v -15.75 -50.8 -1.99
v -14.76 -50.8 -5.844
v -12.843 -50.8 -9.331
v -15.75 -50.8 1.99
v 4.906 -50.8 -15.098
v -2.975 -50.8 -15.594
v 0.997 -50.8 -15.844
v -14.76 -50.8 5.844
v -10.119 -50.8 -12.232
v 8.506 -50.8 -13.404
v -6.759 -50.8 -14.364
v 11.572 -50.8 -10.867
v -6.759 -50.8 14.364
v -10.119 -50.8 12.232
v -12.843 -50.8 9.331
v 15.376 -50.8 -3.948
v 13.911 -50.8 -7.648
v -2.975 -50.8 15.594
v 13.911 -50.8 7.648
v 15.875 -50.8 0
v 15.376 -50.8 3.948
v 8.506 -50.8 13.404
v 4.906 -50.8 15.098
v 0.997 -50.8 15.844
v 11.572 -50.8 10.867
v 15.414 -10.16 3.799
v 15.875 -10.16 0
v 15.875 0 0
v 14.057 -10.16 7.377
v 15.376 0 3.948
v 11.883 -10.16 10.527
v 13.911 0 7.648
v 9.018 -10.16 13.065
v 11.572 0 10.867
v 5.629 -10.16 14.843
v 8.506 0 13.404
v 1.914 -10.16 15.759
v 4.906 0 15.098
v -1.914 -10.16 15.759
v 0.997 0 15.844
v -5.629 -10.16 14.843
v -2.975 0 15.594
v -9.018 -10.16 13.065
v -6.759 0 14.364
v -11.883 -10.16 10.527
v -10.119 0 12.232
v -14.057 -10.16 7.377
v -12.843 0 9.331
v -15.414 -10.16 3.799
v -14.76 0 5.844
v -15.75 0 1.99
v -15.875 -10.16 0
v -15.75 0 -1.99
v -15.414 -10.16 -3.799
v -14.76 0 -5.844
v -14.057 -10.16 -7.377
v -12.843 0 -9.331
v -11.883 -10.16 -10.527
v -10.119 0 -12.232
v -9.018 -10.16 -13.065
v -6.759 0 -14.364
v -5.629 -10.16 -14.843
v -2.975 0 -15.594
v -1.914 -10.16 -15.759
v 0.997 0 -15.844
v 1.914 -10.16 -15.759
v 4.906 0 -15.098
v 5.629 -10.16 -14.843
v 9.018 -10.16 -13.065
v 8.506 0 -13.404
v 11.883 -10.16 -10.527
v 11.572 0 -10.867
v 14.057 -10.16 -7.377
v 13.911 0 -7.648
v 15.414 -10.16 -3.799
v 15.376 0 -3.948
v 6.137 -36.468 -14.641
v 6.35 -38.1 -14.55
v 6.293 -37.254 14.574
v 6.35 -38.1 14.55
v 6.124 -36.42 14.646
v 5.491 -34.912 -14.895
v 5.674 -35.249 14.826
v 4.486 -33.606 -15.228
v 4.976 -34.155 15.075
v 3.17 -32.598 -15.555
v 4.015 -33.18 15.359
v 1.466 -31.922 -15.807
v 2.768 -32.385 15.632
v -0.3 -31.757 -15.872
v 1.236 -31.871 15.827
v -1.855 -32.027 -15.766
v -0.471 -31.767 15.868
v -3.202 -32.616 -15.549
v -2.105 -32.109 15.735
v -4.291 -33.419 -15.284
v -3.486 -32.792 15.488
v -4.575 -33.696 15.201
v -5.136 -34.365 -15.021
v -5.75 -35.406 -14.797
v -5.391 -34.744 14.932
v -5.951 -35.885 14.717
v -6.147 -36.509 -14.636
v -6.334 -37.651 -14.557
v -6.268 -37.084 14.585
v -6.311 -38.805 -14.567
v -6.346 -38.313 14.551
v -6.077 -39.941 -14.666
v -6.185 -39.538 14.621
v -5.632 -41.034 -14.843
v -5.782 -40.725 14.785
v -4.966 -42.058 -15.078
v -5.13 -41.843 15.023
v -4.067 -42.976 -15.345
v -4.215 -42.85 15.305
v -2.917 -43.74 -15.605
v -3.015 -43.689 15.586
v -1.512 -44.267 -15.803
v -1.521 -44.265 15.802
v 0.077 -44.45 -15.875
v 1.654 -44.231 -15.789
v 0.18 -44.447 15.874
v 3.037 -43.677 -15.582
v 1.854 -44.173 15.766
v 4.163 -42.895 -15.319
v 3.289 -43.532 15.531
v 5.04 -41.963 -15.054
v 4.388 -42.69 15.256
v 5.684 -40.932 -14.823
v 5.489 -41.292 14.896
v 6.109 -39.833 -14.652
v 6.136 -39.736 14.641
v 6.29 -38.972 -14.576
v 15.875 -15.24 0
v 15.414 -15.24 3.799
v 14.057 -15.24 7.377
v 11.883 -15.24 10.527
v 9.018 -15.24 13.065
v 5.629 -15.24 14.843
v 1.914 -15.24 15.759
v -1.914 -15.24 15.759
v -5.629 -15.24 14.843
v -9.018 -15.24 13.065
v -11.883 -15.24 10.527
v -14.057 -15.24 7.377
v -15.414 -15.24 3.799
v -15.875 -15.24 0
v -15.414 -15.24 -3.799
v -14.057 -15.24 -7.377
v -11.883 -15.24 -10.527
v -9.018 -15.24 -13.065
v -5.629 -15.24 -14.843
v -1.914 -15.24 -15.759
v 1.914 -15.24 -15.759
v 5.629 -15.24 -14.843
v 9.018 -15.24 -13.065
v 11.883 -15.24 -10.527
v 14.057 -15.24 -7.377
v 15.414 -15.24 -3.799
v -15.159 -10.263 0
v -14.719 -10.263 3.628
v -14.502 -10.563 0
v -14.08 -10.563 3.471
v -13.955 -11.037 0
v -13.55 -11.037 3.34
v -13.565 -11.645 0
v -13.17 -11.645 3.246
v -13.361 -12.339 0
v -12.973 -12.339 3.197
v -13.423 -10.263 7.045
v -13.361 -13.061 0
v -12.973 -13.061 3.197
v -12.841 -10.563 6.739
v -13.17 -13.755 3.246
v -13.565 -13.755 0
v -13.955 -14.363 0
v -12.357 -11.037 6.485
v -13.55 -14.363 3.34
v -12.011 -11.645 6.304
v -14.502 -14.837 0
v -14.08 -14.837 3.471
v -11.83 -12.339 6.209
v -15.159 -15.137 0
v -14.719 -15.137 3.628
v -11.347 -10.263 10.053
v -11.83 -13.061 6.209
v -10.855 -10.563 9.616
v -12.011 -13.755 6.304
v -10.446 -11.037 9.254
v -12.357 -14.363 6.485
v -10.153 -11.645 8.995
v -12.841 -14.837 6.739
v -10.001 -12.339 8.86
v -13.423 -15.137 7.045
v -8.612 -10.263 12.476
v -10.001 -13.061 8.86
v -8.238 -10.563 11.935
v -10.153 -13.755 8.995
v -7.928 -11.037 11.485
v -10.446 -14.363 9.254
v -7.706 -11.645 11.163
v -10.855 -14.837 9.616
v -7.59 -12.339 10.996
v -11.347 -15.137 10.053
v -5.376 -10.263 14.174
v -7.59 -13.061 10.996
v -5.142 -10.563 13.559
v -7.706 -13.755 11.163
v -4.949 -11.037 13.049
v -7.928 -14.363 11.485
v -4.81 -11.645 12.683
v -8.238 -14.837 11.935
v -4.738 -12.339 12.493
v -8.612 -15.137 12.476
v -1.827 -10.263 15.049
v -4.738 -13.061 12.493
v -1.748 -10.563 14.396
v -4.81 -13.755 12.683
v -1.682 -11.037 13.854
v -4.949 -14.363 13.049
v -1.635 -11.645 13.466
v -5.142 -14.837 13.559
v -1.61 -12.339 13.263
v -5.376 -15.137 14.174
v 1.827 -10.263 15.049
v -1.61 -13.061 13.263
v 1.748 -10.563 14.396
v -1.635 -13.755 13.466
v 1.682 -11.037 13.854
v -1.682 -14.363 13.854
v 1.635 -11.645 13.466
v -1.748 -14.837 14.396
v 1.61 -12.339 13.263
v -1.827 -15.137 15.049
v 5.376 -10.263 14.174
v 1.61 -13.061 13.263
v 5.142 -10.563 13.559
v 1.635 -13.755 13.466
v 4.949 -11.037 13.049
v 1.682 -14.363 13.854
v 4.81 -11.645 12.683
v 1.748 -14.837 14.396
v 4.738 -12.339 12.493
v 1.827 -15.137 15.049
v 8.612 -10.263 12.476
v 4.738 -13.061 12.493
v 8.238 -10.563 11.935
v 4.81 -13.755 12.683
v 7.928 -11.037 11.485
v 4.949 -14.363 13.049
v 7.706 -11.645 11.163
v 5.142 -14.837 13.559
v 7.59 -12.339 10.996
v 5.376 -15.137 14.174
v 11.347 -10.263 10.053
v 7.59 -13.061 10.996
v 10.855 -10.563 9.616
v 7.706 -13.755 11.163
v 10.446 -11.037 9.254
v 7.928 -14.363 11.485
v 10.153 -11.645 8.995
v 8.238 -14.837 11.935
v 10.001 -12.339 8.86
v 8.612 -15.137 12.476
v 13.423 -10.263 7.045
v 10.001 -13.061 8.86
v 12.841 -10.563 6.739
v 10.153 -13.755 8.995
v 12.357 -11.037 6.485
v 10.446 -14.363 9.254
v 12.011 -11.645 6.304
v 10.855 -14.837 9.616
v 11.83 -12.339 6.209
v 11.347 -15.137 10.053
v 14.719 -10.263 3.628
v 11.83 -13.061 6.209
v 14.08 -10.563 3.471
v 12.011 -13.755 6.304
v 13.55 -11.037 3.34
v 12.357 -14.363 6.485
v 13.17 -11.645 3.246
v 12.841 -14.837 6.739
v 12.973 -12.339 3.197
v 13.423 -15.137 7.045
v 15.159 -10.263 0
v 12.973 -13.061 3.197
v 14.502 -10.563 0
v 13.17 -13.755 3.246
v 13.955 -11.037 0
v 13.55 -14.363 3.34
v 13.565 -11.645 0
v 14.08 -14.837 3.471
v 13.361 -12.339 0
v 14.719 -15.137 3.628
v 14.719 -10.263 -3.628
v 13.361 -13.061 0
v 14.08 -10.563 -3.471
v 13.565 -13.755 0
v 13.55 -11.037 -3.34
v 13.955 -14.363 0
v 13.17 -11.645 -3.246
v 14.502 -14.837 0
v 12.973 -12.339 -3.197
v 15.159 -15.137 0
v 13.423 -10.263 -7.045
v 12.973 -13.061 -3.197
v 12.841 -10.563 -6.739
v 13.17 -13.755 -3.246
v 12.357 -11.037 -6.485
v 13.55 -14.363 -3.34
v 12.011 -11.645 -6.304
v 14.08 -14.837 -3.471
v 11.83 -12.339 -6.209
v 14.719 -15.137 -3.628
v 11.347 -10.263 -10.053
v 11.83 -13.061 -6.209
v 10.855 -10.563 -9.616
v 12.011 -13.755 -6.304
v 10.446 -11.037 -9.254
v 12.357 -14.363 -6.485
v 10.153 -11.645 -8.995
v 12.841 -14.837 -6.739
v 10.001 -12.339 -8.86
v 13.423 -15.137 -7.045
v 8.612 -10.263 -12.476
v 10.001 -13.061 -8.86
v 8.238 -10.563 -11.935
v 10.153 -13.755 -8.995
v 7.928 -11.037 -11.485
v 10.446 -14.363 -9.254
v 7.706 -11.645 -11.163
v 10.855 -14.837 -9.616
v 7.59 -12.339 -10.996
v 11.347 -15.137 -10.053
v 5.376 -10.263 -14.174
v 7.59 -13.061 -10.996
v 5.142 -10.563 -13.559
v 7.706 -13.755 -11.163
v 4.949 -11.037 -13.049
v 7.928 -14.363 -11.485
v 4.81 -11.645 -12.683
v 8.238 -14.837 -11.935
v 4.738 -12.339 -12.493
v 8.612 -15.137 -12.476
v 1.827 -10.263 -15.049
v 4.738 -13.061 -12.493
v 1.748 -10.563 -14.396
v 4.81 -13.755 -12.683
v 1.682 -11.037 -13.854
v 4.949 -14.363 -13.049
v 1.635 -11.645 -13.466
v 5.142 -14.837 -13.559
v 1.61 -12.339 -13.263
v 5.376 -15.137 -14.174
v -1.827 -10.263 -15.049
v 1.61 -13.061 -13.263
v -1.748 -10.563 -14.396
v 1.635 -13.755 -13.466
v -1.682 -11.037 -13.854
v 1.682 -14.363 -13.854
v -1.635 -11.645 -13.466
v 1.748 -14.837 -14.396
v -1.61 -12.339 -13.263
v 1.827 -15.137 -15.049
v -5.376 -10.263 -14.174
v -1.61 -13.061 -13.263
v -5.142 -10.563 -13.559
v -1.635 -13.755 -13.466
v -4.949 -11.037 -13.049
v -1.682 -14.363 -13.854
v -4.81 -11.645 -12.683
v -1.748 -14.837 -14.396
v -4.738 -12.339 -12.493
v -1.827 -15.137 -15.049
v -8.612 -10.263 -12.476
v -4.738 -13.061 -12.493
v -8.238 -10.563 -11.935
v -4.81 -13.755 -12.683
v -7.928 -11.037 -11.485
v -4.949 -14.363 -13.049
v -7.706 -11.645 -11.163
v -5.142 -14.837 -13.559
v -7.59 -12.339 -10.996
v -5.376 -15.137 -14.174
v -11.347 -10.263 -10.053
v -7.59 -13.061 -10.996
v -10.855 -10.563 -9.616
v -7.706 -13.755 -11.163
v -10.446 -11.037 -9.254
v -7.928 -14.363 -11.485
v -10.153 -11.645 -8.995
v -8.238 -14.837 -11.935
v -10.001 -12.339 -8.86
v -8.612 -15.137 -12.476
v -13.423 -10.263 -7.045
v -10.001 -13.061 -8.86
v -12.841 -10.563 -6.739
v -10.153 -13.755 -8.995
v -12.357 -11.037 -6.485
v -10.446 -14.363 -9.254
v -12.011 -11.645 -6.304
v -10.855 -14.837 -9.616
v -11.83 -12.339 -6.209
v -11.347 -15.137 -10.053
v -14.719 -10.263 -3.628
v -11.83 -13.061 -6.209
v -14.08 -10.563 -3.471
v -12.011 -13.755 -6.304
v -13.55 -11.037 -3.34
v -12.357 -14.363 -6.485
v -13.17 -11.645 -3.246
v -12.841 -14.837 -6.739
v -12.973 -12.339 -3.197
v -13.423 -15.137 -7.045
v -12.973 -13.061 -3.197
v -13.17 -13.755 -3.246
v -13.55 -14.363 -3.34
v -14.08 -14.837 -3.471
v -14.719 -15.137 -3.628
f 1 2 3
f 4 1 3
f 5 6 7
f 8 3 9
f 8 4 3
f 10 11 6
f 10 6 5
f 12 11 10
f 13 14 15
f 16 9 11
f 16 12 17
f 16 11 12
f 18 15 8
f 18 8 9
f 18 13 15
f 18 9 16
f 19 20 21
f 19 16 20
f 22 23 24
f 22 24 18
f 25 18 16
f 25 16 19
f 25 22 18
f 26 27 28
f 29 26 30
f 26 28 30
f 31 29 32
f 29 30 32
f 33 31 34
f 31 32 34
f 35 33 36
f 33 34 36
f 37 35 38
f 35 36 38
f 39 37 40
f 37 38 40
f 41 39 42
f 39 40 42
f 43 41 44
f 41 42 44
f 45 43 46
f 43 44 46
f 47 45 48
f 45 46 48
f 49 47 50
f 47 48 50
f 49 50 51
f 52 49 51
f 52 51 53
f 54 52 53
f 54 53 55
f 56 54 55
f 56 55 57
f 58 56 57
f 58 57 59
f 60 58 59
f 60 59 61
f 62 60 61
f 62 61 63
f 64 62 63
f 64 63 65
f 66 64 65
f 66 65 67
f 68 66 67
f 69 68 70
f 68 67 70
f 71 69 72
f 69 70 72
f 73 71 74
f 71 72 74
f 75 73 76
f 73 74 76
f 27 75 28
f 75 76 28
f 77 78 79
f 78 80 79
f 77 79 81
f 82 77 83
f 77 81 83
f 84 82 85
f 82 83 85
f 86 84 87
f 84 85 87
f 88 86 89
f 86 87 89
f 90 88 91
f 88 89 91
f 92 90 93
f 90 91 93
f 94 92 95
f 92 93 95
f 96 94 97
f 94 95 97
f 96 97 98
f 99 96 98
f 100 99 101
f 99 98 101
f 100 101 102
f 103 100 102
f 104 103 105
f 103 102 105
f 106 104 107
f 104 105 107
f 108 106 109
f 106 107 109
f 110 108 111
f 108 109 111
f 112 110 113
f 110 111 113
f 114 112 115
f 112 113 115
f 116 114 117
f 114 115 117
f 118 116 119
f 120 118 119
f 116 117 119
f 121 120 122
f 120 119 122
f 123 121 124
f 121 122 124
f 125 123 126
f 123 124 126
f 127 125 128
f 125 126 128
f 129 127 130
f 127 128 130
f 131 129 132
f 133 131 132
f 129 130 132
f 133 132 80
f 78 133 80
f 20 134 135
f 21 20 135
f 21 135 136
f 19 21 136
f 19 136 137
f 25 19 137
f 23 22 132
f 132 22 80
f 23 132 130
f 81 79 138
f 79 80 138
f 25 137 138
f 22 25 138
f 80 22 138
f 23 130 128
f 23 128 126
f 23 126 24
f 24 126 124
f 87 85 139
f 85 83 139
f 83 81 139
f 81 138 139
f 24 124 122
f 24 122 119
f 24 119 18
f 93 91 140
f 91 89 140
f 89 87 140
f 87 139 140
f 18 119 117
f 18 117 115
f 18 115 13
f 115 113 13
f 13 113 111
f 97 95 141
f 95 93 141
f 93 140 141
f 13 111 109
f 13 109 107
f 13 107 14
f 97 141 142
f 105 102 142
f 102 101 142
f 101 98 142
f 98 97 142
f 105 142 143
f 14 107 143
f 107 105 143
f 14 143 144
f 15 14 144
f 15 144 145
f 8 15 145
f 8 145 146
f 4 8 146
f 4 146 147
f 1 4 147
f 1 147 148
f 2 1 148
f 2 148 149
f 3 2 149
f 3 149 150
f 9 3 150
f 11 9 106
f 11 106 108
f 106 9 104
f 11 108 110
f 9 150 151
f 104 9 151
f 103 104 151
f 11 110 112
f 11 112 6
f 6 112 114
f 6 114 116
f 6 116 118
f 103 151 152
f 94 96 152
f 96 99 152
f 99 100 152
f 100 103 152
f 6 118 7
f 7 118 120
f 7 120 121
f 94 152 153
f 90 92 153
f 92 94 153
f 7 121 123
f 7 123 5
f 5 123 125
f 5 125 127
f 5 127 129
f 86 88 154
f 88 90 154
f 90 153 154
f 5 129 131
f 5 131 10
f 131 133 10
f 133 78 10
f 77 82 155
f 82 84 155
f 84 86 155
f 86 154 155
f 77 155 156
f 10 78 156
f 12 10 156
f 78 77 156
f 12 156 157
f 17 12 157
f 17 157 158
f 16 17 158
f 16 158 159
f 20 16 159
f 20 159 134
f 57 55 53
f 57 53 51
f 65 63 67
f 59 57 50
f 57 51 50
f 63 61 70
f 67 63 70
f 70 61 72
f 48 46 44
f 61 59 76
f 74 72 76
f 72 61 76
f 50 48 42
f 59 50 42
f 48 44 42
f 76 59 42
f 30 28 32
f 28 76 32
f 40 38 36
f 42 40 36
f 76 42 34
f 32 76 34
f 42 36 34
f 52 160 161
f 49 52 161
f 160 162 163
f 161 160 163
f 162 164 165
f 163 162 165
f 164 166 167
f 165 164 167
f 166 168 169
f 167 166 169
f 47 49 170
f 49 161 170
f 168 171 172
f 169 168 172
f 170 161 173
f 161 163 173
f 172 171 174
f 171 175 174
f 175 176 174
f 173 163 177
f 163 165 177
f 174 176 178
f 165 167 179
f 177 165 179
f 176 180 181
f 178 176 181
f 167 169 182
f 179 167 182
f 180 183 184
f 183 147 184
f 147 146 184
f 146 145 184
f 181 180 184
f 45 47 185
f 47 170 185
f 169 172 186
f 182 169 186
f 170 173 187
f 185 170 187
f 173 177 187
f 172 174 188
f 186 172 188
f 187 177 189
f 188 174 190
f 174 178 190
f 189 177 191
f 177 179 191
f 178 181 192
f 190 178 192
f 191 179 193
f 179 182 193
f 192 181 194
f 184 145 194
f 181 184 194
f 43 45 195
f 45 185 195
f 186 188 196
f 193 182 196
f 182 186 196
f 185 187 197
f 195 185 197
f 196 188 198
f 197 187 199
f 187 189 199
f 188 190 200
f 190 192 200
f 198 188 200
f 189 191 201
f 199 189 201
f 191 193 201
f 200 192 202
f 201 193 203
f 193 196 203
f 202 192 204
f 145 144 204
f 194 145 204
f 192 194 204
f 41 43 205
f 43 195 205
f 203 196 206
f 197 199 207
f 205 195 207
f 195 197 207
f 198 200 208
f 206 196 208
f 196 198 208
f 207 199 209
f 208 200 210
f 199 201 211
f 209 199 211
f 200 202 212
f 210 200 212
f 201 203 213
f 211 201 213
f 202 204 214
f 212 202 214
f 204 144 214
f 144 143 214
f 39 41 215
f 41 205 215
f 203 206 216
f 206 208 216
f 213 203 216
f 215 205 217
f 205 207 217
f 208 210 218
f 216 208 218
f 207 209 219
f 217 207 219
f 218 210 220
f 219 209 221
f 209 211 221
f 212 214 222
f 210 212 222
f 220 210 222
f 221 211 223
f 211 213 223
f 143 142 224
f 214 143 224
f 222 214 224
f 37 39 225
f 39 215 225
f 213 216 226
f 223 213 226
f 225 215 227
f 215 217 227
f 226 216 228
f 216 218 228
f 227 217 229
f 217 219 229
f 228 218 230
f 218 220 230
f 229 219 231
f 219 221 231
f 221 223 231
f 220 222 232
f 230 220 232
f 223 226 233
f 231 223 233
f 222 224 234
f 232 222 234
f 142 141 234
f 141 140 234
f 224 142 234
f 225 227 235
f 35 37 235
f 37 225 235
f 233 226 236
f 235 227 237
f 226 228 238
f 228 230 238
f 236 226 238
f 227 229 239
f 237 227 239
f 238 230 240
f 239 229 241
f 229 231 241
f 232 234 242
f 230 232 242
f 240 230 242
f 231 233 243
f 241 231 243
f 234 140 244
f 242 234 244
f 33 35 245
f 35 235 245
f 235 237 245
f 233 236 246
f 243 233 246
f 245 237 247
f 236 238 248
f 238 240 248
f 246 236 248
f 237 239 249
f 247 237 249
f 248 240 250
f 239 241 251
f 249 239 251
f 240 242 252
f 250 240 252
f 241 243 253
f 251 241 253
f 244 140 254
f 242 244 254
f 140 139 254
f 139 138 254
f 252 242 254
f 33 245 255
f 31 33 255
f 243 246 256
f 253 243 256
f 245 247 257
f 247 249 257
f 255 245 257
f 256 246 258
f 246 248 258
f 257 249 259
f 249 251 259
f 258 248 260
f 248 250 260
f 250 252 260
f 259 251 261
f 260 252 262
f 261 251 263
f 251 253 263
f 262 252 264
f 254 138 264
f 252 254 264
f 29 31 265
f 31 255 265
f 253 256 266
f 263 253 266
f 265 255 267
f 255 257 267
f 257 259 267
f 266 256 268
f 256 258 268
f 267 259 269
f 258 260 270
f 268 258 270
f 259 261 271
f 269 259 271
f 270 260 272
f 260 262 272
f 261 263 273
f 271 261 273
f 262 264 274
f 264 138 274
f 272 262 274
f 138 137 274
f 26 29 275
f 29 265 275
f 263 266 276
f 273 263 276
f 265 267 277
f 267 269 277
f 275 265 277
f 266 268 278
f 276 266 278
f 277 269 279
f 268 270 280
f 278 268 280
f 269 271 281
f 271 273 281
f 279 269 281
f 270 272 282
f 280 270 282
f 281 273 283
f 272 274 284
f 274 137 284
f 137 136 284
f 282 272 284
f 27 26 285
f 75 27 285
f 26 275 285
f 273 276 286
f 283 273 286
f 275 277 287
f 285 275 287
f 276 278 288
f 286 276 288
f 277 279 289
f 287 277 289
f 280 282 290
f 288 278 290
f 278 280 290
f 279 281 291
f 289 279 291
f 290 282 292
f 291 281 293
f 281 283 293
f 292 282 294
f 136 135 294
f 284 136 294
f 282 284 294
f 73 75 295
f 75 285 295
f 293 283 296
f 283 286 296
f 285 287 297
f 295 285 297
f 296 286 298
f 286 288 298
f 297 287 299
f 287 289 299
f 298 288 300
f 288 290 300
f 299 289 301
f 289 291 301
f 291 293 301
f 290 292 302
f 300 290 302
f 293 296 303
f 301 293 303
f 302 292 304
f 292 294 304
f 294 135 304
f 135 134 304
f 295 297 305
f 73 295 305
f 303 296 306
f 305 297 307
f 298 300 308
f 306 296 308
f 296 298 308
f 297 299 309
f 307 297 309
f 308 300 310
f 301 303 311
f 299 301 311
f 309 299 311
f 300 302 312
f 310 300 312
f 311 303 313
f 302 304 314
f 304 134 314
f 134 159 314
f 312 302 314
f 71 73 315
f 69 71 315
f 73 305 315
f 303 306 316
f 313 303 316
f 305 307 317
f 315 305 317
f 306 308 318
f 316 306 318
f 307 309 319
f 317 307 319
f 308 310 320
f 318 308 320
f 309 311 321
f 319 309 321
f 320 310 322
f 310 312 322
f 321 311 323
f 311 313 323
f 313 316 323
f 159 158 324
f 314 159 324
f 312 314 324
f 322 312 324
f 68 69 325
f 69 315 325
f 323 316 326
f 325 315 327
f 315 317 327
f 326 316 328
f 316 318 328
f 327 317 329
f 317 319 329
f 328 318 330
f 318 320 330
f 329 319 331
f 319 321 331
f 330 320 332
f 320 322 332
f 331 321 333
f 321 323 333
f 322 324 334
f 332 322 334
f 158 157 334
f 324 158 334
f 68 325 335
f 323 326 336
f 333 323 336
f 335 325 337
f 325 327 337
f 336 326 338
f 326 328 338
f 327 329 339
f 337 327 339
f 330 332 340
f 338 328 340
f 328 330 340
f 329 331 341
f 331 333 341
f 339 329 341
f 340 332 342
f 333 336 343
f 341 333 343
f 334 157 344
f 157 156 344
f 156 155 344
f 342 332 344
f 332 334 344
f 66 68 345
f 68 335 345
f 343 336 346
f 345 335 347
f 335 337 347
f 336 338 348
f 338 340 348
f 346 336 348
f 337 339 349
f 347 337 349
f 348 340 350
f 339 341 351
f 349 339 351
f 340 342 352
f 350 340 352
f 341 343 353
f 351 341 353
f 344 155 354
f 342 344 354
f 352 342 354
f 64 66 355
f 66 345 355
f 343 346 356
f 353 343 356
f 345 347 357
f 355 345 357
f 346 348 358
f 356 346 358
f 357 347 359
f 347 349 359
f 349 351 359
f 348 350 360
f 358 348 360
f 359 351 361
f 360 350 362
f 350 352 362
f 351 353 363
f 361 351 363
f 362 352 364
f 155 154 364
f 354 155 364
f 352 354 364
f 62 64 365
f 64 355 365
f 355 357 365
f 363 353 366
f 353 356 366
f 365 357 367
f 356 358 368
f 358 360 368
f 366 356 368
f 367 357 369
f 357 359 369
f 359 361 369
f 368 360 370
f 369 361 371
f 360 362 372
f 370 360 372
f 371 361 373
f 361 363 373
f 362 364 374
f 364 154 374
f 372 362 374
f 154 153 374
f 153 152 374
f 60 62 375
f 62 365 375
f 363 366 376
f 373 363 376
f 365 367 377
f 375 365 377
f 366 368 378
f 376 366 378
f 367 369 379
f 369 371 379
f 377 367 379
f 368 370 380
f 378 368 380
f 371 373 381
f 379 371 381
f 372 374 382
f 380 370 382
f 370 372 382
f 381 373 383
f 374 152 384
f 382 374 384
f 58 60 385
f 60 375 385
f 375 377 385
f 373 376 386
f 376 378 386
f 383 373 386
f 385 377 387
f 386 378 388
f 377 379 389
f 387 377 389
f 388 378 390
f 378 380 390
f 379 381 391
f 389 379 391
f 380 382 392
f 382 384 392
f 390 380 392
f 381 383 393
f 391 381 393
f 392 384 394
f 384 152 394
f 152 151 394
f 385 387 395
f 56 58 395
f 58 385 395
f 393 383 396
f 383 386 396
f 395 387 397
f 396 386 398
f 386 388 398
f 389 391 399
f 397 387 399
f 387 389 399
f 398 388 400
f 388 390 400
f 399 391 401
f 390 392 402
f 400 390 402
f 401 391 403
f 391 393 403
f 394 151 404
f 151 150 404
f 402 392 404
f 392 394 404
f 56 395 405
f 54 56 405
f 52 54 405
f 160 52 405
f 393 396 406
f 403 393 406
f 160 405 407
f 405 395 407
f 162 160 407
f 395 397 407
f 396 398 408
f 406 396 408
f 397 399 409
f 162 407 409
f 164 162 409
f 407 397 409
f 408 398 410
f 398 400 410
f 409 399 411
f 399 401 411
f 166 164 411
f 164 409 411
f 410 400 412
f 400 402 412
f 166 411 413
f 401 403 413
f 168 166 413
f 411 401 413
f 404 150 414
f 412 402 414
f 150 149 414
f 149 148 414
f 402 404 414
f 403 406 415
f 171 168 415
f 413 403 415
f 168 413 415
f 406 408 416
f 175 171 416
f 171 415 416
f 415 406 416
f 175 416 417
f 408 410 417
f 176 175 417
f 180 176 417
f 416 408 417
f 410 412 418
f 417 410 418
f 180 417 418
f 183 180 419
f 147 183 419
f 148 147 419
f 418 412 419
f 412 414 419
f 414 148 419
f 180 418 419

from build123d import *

# Parameters (mm, degrees)
F0_R          = 15.875
F1_DEPTH      = 50.8
F4_R          = 2.54
F6_R          = 6.35
F7_DEPTH      = 15.875
F7_DEPTH_BACK = 15.875


with BuildPart() as f1:
    # F0 (on Front) → F1 (new body)
    with BuildSketch(Plane.XZ):
        Circle(F0_R)
    extrude(amount=F1_DEPTH)

    # F5: sweep along a path in F3
    with BuildLine(Plane(origin=(0, -12.7, 0), x_dir=(-1, 0, 0), z_dir=(0, 1, 0))) as f5_path:
        CenterArc((0, 0), 15.875, 0, 360)
    # F4 (on Right) → F5 (sweep, cut)
    with BuildSketch(Plane.YZ):
        with Locations((-12.7, 15.875)):
            Circle(F4_R)
    sweep(path=f5_path.line, mode=Mode.SUBTRACT)

    # F6 (on Top) → F7 (cut, two sides)
    with BuildSketch(Plane.XY) as f7_sk:
        with Locations((0, -38.1)):
            Circle(F6_R)
    extrude(amount=-F7_DEPTH, mode=Mode.SUBTRACT)
    extrude(f7_sk.sketch, amount=F7_DEPTH_BACK, mode=Mode.SUBTRACT)


solid = f1.part
